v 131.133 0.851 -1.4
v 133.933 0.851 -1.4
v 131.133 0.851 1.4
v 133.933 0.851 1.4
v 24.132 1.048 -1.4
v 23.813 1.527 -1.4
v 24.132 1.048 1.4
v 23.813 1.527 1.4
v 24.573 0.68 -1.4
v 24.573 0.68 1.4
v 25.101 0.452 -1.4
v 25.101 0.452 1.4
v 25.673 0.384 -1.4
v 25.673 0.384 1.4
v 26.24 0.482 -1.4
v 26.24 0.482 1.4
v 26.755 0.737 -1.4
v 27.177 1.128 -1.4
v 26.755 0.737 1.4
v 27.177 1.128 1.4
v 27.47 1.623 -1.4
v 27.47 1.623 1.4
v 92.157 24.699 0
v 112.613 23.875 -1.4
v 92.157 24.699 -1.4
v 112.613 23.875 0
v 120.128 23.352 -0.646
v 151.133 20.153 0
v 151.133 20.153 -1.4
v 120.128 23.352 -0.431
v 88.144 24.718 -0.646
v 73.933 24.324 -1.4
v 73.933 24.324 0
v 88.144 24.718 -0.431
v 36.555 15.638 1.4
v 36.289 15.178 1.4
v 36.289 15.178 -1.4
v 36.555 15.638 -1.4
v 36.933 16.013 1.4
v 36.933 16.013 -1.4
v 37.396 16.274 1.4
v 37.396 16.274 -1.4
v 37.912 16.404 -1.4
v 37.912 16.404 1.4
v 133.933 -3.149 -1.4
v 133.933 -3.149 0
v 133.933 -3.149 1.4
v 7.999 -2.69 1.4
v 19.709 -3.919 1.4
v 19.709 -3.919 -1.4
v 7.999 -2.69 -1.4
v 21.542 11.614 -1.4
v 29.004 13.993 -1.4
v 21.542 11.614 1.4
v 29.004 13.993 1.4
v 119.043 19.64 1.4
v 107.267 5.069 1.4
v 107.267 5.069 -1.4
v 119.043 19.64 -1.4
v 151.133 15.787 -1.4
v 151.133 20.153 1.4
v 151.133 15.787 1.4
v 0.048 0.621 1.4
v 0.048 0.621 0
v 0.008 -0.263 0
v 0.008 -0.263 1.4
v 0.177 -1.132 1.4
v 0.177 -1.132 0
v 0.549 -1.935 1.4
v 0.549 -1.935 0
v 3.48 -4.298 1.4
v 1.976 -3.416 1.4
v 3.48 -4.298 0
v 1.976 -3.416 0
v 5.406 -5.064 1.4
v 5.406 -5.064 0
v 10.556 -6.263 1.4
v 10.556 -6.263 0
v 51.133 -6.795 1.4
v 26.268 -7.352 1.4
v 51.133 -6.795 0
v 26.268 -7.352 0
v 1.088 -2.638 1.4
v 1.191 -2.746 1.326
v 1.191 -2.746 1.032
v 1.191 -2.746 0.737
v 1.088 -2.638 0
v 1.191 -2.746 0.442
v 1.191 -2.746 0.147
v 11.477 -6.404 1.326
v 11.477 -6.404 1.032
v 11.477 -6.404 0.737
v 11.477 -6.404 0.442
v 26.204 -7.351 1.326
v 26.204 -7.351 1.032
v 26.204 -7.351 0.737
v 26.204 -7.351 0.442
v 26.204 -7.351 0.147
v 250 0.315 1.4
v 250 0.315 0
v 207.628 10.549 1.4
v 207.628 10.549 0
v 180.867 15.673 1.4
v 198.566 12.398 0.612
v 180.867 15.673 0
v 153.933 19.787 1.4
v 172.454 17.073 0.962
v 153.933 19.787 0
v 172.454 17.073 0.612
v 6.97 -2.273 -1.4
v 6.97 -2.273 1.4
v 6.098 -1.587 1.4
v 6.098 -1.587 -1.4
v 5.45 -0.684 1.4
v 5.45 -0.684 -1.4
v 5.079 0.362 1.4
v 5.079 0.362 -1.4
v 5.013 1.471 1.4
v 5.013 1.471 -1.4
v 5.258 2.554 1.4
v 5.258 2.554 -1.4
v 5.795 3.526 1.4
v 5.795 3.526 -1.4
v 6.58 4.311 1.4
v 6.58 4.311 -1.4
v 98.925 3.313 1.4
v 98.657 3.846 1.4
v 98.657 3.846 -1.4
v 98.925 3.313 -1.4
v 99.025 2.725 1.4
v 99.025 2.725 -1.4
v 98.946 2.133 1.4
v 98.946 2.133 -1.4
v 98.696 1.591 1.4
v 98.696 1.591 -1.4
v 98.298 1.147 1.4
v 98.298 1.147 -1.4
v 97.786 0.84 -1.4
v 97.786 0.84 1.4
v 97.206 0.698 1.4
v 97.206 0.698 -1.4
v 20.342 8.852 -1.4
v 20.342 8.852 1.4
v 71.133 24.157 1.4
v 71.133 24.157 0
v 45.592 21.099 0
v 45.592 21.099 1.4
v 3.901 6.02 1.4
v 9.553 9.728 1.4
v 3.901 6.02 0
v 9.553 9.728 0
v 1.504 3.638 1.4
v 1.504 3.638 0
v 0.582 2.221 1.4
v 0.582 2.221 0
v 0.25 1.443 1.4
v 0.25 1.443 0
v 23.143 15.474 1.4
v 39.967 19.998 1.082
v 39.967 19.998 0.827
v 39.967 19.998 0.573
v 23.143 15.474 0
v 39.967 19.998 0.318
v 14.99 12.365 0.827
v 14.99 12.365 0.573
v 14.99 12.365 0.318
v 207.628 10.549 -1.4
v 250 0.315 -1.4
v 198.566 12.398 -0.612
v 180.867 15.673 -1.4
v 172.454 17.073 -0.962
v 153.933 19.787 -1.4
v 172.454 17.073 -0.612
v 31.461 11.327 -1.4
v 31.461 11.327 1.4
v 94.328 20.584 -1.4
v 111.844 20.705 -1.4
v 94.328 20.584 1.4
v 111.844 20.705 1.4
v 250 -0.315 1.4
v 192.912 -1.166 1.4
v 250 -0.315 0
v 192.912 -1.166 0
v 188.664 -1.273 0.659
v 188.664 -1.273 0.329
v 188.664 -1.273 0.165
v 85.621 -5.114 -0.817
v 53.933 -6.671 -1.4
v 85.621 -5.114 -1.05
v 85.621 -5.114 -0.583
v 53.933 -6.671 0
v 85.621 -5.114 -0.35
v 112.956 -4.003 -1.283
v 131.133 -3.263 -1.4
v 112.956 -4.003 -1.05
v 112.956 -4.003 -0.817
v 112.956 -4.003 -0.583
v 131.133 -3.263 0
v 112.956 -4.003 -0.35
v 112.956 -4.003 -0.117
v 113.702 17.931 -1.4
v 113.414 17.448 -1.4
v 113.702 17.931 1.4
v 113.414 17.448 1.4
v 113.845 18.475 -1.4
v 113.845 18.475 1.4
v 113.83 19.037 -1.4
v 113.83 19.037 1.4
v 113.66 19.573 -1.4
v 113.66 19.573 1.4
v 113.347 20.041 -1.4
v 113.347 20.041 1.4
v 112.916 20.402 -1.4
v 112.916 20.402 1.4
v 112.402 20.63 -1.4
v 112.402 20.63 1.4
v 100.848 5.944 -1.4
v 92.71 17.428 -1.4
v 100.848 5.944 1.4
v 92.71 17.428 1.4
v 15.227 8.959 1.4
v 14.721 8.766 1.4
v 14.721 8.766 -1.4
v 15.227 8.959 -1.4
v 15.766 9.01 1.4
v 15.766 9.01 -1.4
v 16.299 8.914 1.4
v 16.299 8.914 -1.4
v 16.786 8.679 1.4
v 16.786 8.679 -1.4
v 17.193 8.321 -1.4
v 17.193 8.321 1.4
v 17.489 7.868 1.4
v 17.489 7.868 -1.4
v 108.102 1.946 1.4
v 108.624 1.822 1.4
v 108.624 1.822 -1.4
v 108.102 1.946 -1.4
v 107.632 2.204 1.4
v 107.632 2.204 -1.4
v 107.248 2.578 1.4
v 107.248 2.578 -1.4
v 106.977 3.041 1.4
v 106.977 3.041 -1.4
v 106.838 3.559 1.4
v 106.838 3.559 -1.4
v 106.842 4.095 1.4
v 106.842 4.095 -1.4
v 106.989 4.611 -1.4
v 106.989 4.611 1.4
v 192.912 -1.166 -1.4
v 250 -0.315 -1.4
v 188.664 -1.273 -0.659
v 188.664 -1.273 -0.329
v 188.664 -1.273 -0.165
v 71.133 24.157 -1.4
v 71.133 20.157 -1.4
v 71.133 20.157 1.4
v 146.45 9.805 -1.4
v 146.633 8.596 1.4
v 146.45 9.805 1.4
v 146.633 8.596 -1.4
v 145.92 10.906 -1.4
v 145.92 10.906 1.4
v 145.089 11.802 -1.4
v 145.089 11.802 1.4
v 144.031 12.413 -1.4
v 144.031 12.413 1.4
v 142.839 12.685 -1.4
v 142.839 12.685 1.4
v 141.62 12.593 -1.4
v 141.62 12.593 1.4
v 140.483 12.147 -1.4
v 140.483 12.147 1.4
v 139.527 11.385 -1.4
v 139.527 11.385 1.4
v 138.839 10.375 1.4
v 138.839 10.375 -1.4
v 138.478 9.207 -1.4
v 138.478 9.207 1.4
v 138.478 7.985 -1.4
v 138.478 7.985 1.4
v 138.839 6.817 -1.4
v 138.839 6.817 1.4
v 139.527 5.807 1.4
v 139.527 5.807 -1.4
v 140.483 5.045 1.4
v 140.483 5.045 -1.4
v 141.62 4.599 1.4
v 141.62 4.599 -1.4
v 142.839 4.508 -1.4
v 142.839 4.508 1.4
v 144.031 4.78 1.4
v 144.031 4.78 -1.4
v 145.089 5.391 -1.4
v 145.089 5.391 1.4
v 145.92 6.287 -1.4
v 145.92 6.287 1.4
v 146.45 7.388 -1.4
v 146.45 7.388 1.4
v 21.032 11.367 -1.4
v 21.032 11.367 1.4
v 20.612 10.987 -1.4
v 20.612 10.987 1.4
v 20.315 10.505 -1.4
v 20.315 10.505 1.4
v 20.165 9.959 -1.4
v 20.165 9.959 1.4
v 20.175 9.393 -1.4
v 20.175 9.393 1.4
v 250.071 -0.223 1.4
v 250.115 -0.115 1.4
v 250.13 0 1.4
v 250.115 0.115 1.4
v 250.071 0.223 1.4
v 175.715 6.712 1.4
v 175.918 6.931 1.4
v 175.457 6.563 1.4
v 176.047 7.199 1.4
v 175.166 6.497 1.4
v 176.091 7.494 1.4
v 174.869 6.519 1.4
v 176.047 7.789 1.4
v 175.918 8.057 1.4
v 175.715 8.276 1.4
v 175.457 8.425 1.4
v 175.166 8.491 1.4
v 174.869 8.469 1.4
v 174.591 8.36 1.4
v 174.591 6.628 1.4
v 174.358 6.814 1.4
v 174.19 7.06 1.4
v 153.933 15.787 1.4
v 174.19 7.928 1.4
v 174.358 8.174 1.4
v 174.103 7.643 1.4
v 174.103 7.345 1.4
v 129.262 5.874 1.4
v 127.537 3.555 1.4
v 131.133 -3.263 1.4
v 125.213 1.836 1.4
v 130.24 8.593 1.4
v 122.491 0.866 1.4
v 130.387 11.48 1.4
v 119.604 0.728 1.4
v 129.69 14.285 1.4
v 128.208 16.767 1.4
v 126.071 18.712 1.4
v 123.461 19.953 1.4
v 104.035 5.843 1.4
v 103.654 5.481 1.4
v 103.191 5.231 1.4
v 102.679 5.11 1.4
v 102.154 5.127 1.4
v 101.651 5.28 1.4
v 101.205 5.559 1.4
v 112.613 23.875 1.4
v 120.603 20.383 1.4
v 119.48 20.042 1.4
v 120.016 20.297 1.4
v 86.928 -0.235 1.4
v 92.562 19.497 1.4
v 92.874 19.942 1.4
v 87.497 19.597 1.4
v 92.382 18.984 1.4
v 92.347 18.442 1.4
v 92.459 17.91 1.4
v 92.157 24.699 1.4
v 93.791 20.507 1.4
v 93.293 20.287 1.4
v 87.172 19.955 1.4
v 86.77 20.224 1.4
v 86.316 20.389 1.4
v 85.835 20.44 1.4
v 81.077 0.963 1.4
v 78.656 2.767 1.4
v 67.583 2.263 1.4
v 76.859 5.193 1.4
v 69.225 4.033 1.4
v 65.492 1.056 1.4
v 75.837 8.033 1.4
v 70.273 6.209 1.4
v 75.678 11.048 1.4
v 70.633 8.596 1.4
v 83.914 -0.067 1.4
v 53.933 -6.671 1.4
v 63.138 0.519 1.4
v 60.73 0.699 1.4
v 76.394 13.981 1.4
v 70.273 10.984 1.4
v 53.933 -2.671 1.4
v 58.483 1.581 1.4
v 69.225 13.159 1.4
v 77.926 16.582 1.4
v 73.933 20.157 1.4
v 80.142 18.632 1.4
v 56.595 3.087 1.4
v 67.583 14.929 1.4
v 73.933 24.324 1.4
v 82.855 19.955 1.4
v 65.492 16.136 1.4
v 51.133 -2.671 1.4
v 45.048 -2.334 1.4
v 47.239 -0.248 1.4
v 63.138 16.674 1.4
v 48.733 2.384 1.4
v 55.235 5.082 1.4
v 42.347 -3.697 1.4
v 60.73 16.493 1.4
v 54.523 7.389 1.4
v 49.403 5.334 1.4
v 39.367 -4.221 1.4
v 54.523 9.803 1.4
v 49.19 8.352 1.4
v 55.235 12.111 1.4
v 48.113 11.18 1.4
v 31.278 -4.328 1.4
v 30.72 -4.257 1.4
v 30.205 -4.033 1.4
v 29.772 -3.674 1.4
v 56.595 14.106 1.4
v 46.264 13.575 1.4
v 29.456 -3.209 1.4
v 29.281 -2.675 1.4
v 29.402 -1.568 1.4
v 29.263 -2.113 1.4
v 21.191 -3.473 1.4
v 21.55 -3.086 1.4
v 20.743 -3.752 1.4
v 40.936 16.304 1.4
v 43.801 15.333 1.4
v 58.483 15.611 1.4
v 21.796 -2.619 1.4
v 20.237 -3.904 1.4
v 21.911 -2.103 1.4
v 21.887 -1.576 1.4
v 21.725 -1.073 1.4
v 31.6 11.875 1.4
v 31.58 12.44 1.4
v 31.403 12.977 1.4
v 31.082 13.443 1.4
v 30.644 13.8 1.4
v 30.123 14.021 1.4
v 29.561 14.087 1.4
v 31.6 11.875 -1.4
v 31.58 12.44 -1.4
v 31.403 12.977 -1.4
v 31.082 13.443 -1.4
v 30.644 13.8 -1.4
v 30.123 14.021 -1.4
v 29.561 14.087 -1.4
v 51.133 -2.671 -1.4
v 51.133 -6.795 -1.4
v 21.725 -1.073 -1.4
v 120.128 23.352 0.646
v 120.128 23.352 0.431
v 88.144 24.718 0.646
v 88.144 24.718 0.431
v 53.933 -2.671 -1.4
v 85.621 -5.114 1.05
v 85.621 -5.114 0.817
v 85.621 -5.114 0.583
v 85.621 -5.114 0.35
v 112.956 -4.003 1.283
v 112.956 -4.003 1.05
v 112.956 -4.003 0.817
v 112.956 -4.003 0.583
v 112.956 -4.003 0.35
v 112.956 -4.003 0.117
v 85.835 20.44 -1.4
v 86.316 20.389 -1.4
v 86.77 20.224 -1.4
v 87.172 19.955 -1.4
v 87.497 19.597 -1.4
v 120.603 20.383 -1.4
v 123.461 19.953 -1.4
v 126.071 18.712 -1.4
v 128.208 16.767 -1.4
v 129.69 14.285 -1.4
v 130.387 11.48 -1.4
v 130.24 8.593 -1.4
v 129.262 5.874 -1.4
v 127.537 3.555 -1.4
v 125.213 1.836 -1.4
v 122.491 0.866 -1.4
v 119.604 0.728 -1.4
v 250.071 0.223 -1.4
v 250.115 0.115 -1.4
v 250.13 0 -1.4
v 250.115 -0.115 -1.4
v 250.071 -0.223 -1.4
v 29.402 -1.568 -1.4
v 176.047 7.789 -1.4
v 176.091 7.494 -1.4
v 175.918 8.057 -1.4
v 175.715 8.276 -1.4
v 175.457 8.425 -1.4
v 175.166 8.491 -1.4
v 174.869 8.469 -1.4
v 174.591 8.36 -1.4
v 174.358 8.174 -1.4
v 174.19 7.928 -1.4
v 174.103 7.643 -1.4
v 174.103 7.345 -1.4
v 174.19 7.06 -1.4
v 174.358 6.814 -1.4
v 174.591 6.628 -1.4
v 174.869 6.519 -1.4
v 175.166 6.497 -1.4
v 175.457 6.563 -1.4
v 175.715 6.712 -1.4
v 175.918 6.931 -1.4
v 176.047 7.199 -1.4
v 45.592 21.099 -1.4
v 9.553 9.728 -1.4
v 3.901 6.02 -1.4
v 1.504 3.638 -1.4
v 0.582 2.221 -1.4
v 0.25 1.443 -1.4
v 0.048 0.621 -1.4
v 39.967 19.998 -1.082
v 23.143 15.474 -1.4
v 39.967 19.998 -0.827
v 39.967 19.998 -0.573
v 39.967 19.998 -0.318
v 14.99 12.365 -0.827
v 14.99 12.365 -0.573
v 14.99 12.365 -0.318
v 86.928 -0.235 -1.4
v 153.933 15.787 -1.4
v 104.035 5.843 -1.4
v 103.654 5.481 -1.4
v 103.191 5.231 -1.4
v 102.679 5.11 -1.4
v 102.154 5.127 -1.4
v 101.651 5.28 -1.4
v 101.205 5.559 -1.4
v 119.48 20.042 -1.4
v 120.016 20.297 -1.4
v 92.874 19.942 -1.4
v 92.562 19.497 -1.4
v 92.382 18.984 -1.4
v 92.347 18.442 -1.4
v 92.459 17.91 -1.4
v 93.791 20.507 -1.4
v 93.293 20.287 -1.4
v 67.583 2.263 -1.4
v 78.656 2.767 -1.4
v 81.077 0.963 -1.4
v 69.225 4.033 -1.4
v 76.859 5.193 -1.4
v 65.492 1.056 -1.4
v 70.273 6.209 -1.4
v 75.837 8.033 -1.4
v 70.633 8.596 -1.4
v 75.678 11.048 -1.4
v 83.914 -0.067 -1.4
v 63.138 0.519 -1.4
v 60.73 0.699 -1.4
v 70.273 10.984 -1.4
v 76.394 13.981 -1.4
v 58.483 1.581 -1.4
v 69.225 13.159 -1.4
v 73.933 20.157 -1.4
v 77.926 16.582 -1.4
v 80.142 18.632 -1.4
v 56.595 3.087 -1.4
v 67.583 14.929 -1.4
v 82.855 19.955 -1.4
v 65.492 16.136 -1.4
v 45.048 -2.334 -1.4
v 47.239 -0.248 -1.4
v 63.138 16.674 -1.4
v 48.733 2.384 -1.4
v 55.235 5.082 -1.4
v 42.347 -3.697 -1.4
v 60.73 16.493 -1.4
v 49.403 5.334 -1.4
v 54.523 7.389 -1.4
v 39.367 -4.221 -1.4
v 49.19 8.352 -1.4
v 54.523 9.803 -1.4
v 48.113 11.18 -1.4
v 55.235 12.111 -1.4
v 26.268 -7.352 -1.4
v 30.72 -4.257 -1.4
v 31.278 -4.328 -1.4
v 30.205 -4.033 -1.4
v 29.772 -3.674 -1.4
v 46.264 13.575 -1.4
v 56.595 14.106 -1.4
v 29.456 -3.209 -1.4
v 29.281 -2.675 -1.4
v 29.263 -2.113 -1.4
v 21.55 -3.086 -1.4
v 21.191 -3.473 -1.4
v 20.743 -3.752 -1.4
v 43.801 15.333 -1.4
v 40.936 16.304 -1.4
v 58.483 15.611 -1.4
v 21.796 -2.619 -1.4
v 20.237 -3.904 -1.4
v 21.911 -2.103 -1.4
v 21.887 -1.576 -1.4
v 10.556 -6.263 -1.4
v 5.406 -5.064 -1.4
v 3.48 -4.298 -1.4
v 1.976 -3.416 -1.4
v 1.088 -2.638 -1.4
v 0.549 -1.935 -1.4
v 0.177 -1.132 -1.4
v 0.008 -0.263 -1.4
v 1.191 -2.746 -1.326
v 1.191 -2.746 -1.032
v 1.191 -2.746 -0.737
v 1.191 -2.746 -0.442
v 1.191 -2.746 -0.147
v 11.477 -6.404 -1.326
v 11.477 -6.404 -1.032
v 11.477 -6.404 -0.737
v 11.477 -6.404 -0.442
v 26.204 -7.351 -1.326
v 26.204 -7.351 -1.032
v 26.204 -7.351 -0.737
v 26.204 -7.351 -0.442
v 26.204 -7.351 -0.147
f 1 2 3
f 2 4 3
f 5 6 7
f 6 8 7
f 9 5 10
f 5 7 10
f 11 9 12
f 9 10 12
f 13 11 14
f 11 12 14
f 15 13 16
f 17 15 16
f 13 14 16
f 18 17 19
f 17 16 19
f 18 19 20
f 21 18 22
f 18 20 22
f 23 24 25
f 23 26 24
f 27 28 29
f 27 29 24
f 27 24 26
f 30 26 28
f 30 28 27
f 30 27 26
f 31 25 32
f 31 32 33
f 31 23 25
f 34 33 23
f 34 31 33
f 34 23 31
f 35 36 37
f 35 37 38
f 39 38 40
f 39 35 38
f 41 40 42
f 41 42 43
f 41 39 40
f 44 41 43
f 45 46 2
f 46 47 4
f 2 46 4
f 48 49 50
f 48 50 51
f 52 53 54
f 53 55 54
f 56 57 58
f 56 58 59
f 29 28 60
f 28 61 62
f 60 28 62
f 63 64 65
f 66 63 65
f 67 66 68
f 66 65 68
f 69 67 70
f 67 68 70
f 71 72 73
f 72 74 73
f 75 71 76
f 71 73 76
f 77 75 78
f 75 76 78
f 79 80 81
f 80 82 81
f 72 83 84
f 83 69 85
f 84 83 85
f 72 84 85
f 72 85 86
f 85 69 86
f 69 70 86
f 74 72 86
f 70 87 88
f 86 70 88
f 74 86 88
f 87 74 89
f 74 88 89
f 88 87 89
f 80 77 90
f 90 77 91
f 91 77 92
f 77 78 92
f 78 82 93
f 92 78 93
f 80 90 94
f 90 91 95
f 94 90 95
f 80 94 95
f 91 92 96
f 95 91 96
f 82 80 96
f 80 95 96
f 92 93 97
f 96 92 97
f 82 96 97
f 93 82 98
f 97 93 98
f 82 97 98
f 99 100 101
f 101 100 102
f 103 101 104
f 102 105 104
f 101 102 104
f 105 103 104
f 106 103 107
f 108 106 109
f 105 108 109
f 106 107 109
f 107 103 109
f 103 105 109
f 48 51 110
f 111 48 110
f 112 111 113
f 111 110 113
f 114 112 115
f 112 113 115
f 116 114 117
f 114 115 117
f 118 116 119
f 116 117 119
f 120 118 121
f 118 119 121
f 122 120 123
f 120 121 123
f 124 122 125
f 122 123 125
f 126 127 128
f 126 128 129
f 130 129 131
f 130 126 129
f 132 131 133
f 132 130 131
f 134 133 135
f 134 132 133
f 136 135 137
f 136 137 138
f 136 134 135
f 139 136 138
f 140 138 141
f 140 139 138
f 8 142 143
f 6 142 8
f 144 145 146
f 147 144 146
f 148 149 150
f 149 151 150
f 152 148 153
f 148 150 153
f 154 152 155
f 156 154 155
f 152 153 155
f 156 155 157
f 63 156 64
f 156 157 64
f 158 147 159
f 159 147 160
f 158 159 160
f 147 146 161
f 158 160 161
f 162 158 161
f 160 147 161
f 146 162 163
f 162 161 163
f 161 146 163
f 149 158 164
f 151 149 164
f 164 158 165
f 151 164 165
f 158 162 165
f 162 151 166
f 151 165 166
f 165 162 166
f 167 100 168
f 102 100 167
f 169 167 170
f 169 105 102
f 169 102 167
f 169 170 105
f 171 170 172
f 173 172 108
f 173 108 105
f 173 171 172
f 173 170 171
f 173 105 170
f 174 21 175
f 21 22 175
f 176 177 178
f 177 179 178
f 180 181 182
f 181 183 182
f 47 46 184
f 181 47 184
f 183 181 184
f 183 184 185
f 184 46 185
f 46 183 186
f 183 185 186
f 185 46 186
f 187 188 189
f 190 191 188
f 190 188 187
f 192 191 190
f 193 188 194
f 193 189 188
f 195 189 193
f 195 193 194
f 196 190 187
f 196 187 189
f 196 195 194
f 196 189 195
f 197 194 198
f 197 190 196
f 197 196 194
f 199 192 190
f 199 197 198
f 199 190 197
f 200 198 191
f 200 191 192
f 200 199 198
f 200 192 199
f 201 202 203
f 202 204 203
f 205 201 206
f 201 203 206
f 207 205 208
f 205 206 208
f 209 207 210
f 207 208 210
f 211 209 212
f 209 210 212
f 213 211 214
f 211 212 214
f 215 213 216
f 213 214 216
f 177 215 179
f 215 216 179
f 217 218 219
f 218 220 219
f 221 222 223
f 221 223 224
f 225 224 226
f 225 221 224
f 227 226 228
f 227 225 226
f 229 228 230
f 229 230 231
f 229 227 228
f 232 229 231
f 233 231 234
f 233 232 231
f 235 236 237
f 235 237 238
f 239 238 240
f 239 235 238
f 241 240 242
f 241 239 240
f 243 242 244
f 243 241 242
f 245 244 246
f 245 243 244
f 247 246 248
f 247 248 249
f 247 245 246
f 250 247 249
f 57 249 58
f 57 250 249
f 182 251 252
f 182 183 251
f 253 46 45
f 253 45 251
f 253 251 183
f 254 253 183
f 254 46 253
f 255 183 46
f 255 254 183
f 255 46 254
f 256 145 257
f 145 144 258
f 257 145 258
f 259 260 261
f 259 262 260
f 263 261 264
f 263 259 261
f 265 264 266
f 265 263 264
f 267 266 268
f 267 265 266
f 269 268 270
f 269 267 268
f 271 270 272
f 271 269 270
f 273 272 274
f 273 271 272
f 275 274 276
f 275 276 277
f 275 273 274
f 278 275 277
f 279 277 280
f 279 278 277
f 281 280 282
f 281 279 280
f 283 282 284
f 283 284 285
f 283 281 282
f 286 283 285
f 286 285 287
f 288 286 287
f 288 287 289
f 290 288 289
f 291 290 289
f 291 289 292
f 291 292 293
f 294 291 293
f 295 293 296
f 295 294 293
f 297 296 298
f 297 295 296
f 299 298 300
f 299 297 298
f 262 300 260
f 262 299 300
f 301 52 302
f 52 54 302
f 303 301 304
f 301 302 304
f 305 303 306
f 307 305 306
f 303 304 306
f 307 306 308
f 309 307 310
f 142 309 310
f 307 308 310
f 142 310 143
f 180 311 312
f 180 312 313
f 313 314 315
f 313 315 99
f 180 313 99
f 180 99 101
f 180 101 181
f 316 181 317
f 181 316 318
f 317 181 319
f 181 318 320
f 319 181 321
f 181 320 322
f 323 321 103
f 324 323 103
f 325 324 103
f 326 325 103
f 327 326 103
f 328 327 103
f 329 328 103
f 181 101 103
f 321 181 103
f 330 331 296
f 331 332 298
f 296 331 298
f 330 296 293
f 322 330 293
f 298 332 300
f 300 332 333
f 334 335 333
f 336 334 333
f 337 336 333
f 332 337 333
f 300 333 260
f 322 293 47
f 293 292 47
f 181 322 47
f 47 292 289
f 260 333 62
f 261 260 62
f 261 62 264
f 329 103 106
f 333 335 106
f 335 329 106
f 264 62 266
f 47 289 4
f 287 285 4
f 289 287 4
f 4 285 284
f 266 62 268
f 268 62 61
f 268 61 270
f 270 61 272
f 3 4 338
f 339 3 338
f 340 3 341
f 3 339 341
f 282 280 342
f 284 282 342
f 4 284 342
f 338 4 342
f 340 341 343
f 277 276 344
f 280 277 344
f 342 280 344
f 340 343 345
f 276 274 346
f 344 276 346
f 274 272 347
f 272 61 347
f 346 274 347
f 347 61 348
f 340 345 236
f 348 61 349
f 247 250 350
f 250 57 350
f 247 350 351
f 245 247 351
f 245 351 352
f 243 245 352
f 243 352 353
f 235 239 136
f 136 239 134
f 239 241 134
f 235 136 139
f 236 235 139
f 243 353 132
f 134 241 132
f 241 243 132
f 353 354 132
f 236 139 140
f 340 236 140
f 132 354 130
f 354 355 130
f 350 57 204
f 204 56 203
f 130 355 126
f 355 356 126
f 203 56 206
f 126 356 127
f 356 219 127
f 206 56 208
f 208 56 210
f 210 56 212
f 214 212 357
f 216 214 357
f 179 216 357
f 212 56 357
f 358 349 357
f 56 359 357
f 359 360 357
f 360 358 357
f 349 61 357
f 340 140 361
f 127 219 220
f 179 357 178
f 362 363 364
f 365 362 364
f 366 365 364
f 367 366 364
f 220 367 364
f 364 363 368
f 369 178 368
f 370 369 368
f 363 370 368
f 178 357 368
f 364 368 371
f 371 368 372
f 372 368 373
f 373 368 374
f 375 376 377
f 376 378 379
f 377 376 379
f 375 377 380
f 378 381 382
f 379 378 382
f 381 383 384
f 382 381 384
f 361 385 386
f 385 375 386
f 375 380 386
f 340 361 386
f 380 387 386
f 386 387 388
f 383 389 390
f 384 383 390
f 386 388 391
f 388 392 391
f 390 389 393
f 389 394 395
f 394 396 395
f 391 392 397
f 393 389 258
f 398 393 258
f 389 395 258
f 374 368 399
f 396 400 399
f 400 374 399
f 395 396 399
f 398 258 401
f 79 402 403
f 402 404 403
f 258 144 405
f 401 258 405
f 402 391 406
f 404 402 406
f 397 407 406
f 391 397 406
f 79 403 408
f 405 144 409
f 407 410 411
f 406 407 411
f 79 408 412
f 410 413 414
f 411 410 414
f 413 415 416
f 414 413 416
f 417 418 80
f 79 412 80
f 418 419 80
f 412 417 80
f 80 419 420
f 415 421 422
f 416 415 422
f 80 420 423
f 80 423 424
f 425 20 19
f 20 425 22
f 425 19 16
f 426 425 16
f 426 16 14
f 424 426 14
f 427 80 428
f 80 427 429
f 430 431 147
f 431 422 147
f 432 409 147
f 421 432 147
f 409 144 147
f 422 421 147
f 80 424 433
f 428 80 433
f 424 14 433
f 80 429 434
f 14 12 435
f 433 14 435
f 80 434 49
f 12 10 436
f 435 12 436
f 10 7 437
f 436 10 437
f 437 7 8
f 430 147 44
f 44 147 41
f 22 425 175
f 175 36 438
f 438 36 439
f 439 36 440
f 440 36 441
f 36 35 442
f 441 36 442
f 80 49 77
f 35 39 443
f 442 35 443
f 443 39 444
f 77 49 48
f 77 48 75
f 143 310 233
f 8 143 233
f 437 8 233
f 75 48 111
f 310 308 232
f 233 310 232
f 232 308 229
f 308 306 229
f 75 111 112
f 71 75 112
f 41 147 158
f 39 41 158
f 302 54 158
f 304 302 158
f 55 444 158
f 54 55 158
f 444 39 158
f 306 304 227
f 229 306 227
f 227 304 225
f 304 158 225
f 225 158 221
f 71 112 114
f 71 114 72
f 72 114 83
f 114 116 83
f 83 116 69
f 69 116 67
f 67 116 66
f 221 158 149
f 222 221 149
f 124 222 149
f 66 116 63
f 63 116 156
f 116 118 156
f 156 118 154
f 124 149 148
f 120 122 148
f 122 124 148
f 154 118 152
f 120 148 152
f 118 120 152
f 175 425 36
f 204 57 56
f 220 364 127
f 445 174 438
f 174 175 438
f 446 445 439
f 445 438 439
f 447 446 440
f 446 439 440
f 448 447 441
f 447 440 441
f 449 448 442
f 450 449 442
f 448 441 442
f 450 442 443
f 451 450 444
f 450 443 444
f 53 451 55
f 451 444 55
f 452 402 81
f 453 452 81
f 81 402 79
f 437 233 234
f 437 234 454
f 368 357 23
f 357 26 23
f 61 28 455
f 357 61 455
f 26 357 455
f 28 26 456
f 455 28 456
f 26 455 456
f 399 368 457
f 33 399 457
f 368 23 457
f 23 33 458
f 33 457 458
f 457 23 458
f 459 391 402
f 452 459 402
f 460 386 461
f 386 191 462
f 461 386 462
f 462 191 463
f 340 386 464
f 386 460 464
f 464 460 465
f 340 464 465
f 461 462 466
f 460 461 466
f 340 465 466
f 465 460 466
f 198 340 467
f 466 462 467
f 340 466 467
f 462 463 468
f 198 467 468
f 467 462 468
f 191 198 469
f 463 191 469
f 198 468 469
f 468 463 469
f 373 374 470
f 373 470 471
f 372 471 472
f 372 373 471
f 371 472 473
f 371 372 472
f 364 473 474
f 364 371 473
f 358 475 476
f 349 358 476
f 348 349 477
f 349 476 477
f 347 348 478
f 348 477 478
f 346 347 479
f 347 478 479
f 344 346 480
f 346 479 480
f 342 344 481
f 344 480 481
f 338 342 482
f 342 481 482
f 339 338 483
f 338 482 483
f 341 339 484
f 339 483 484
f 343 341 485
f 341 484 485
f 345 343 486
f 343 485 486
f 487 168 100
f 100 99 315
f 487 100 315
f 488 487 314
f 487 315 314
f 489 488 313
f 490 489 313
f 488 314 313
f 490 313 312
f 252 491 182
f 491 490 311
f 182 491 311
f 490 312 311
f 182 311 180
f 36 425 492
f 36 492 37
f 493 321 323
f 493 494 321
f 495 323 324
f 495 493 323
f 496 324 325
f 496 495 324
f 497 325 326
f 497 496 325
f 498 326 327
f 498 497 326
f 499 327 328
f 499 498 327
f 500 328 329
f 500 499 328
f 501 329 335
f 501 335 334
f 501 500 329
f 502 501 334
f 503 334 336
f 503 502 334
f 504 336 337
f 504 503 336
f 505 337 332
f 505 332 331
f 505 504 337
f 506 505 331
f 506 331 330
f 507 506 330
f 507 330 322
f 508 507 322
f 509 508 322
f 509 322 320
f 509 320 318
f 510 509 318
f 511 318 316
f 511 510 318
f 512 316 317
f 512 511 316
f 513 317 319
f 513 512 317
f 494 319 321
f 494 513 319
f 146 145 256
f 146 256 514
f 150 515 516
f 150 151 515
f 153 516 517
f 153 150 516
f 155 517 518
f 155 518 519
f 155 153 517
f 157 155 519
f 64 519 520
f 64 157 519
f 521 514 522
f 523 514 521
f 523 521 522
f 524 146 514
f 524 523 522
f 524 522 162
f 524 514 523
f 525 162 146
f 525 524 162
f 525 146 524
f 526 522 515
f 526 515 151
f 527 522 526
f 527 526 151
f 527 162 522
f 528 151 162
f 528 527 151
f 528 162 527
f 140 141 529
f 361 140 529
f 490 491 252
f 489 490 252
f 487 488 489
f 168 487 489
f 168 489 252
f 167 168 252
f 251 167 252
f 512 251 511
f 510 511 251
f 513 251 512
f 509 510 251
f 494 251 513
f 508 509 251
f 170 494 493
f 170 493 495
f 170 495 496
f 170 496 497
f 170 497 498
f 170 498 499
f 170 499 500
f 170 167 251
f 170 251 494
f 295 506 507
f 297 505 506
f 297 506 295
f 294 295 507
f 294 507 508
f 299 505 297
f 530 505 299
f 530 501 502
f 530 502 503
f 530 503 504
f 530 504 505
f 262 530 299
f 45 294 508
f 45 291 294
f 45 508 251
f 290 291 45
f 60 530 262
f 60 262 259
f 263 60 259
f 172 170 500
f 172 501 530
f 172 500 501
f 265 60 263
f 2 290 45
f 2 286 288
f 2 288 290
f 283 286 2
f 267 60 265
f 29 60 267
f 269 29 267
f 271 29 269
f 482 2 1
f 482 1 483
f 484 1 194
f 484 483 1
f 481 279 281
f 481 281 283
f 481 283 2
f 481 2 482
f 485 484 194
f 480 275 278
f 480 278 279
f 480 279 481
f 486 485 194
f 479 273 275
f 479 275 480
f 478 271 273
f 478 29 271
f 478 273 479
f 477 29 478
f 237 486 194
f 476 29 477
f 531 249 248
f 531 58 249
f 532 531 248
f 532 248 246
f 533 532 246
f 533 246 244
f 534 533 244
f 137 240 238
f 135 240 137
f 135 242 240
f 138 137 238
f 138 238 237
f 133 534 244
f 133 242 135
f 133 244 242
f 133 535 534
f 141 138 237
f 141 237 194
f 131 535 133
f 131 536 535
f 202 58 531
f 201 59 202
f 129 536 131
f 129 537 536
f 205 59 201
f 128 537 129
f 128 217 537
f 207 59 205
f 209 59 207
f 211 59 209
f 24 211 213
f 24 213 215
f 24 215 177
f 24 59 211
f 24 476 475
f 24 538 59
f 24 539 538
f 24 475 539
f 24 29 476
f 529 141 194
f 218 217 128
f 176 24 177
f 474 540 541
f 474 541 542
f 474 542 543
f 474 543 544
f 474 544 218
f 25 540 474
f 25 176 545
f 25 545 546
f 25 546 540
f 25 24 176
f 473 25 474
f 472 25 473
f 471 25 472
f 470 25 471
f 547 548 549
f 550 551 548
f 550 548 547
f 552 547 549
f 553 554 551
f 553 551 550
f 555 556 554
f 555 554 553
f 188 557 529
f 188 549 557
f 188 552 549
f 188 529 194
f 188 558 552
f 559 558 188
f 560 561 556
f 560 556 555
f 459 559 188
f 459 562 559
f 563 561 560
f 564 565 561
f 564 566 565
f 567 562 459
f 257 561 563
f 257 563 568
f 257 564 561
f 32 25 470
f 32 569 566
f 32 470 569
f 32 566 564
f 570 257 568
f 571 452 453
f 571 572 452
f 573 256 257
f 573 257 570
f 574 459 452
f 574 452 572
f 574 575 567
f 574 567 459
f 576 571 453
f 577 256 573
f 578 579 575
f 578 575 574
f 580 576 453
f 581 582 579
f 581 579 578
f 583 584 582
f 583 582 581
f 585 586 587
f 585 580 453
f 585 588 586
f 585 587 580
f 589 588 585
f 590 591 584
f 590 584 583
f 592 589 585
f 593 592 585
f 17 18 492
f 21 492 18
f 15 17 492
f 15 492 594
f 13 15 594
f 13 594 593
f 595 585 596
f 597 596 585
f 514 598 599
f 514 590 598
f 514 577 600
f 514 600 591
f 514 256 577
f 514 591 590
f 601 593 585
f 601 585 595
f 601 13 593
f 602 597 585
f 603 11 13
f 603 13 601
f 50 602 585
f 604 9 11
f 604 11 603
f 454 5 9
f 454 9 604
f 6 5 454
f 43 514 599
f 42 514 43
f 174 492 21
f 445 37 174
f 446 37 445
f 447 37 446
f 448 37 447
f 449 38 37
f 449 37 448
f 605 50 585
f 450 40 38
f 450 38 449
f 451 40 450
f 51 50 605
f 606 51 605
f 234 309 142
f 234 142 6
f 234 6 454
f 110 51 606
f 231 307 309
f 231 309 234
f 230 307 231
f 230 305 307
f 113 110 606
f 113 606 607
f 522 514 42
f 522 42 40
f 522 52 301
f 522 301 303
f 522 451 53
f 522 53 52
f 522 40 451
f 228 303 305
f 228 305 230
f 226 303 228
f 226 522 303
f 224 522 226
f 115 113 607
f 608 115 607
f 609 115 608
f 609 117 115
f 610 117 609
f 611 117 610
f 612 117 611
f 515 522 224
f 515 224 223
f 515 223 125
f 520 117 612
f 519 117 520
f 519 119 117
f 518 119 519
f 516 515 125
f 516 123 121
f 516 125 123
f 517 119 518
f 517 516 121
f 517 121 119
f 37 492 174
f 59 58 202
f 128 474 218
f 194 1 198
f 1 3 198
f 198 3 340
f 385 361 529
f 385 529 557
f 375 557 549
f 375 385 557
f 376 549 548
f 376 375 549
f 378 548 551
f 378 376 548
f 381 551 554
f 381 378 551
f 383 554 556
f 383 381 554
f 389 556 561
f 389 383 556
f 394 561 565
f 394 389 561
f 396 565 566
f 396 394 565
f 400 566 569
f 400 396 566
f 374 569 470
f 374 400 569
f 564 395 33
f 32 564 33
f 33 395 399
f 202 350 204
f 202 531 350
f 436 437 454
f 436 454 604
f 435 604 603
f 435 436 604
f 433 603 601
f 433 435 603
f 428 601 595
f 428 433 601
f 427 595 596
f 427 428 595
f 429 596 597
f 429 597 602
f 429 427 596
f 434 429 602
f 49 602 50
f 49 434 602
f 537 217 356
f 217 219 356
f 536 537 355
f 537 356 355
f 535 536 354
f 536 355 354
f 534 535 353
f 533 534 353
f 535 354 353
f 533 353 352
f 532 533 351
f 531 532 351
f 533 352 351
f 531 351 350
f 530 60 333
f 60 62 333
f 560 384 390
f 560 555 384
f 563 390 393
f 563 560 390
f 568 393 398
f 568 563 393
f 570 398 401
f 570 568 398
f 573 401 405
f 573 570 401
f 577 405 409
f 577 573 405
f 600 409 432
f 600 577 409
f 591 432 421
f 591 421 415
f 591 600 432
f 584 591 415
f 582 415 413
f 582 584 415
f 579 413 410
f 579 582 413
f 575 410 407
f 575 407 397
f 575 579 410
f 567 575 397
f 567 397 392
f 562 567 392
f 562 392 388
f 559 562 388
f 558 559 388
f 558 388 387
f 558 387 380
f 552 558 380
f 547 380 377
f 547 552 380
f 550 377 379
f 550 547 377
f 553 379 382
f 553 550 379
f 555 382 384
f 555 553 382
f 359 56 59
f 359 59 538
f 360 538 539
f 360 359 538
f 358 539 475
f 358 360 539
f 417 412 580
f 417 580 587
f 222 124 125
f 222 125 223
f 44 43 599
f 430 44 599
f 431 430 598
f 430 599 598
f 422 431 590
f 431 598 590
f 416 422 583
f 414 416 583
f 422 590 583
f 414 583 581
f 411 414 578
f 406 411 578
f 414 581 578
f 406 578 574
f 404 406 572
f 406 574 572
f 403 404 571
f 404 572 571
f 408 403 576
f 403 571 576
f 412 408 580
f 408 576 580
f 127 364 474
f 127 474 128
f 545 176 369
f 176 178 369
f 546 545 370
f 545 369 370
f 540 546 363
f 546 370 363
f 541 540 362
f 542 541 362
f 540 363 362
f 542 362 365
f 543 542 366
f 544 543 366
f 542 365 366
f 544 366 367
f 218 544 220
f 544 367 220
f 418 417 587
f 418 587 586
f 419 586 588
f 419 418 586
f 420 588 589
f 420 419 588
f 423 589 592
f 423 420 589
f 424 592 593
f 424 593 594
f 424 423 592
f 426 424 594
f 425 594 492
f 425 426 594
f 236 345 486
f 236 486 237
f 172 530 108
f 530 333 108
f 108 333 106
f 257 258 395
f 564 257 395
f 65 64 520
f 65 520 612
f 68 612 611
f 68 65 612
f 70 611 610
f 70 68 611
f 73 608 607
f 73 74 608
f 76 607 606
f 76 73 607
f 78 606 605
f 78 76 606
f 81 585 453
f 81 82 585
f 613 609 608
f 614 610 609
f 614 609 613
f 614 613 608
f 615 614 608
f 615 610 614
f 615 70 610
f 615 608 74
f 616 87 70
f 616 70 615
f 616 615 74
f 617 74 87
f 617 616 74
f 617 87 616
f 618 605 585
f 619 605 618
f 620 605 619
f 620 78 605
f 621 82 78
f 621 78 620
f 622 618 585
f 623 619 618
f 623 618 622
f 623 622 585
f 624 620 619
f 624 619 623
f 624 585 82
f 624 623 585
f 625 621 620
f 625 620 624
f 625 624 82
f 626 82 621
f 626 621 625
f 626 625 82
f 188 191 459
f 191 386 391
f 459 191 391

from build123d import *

# Parameters (mm, degrees)
SKETCH_2_R      = 8.1
SKETCH_2_R_2    = 4.1
SKETCH_2_R_3    = 1
EXTRUDE_2_DEPTH = 1.4


with BuildPart() as part:
    # Эскиз2 → Бобышка-Вытянуть2 (new, symmetric)
    with BuildSketch(Plane.XY):
        with BuildLine():
            Line((151.132619318, 20.152925753), (151.132619318, 15.787470759))
            Line((151.132619318, 15.787470759), (153.932619318, 15.787470759))
            Line((153.932619318, 15.787470759), (153.932619318, 19.787470759))
            add(Edge.make_bspline(
                [(250, 0.315), (249.15566774, 0.545019818), (246.720175697, 1.208516241), (242.391332083, 2.35833905), (236.849761203, 3.787625359), (230.779918277, 5.29800883), (224.455917945, 6.812866018), (218.030543493, 8.29161062), (211.562405041, 9.719735042), (205.072411505, 11.092374915), (198.567970908, 12.407850707), (192.052369908, 13.665297902), (185.527619967, 14.864093279), (178.995338985, 16.003404752), (172.457064735, 17.082388086), (165.914317088, 18.099827809), (159.739714866, 19.000386852), (155.744292591, 19.547112651), (153.932619318, 19.787470759)],
                knots=[0, 0, 0, 0, 0.0101622, 0.029313053, 0.052011605, 0.076619468, 0.101948061, 0.127526132, 0.153184131, 0.178867888, 0.204557903, 0.230245712, 0.255925967, 0.281594302, 0.30724642, 0.332878042, 0.358484538, 0.379707003, 0.379707003, 0.379707003, 0.379707003], degree=3))
            ThreePointArc((250, 0.315), (250.130477272, 0), (250, -0.315))
            add(Edge.make_bspline(
                [(133.932619318, -3.149352186), (136.150252366, -3.05984138), (140.66441482, -2.879164577), (147.472013762, -2.613922958), (154.352602411, -2.355626415), (161.225044134, -2.109369921), (168.090869746, -1.876634074), (174.951578522, -1.658643104), (181.808595966, -1.456378123), (188.663234462, -1.270383377), (195.516645168, -1.101112884), (202.369532894, -0.948617189), (211.49919029, -0.767742353), (220.603098666, -0.619939742), (229.617630172, -0.50292618), (236.087353854, -0.431514192), (241.980776913, -0.376520461), (246.558970011, -0.339535886), (249.120490965, -0.321271242), (250, -0.315)],
                knots=[0.541906346, 0.541906346, 0.541906346, 0.541906346, 0.568176028, 0.595379569, 0.622543445, 0.64967326, 0.676775201, 0.703855228, 0.730918775, 0.757971338, 0.785017763, 0.812061651, 0.839103366, 0.893099152, 0.919831065, 0.945809917, 0.969680601, 0.989589706, 1, 1, 1, 1], degree=3))
            Line((133.932619318, -3.149352186), (133.932619318, 0.850647814))
            Line((133.932619318, 0.850647814), (131.132619318, 0.850647814))
            Line((131.132619318, 0.850647814), (131.132619318, -3.262735091))
            add(Edge.make_bspline(
                [(53.932619318, -6.670677263), (55.356569482, -6.605720394), (59.058679651, -6.431131786), (65.052094606, -6.13285227), (71.91077271, -5.784005184), (78.771375577, -5.439680462), (85.61049861, -5.110951262), (92.43210759, -4.804953337), (99.255031191, -4.531981668), (106.097378406, -4.278274685), (112.969211681, -4.003089942), (119.864404255, -3.723176202), (125.92308308, -3.47492717), (129.679854903, -3.321735217), (131.132619318, -3.262735091)],
                knots=[0.225966113, 0.225966113, 0.225966113, 0.225966113, 0.242837762, 0.269833583, 0.296993022, 0.324123272, 0.351139107, 0.378035509, 0.404946016, 0.431960837, 0.459078395, 0.4863474, 0.51364083, 0.530850189, 0.530850189, 0.530850189, 0.530850189], degree=3))
            Line((53.932619318, -6.670677263), (53.932619318, -2.670677263))
            Line((53.932619318, -2.670677263), (51.132619318, -2.670677263))
            Line((51.132619318, -2.670677263), (51.132619318, -6.795360627))
            add(Edge.make_bspline(
                [(0.047975001, 0.621424995), (0.022713821, 0.373490081), (-0.027820788, -0.12249998), (0.077991213, -0.884434595), (0.349695651, -1.638838075), (0.814331136, -2.365068928), (1.463480781, -3.039275249), (2.290973018, -3.660999474), (3.305928751, -4.235779626), (4.53525562, -4.773674148), (6.029745689, -5.282192169), (7.868981216, -5.765316681), (10.168831393, -6.221716597), (13.07543819, -6.639618735), (16.728115364, -6.992956742), (21.189952097, -7.247345149), (26.399984417, -7.376638853), (32.197398565, -7.376256917), (38.39780676, -7.261436583), (44.752137938, -7.05998551), (49.023344092, -6.886827907), (51.132619318, -6.795360627)],
                knots=[0, 0, 0, 0, 0.002941446, 0.005884319, 0.00901613, 0.012364547, 0.016007934, 0.020036845, 0.024573728, 0.029783835, 0.03589701, 0.04324044, 0.052275965, 0.063634589, 0.077983176, 0.095698161, 0.116520086, 0.13966073, 0.16431217, 0.18991889, 0.214908072, 0.214908072, 0.214908072, 0.214908072], degree=3))
            add(Edge.make_bspline(
                [(71.132619318, 24.157469486), (70.635982629, 24.125241372), (68.110579653, 23.953963558), (63.575410502, 23.578006358), (57.555189551, 22.924946655), (51.605762689, 22.119065518), (45.744400312, 21.156564429), (39.995857594, 20.035371386), (34.397919843, 18.75631623), (29.010382104, 17.327615604), (23.925798409, 15.771864917), (19.27067884, 14.13426943), (15.179098392, 12.483335433), (11.740475791, 10.89561099), (8.959371869, 9.429577361), (6.760891181, 8.108603195), (5.033709749, 6.92463805), (3.671694934, 5.85422966), (2.592101124, 4.871305364), (1.738175669, 3.952595739), (1.069870831, 3.080946369), (0.571645411, 2.241622098), (0.2157739, 1.430785392), (0.102255582, 0.88324169), (0.047975001, 0.621424995)],
                knots=[0.701142916, 0.701142916, 0.701142916, 0.701142916, 0.706922144, 0.73053591, 0.7539832, 0.77723469, 0.800246382, 0.822950709, 0.845237155, 0.866915896, 0.887662335, 0.906968281, 0.924203157, 0.938878975, 0.950931611, 0.960693484, 0.968646729, 0.975232933, 0.980794744, 0.985583761, 0.989781539, 0.993521313, 0.996902113, 1, 1, 1, 1], degree=3))
            Line((71.132619318, 24.157469486), (71.132619318, 20.157469486))
            Line((71.132619318, 20.157469486), (73.932619318, 20.157469486))
            Line((73.932619318, 20.157469486), (73.932619318, 24.323871534))
            add(Edge.make_bspline(
                [(151.132619318, 20.152925753), (149.51271539, 20.360855756), (145.712882211, 20.834305053), (139.731359791, 21.525676112), (133.19183673, 22.212004248), (126.658683026, 22.825721427), (120.136770918, 23.363973264), (113.62856714, 23.824677322), (107.152732037, 24.200242592), (100.741095693, 24.498399508), (94.411752715, 24.686649766), (88.155917993, 24.740095648), (81.949043055, 24.658849141), (77.212383792, 24.491578654), (74.545027167, 24.35694527), (73.932619318, 24.323871534)],
                knots=[0.390637302, 0.390637302, 0.390637302, 0.390637302, 0.409602822, 0.435103874, 0.460559416, 0.485959195, 0.51130307, 0.536551515, 0.561723366, 0.586628867, 0.611085431, 0.6352512, 0.659272176, 0.683163753, 0.690285585, 0.690285585, 0.690285585, 0.690285585], degree=3))
        make_face()
        with Locations((62.532619318, 8.596197208)):
            Circle(SKETCH_2_R, mode=Mode.SUBTRACT)
        with Locations((142.532619318, 8.596197208)):
            Circle(SKETCH_2_R_2, mode=Mode.SUBTRACT)
        with Locations((175.091334091, 7.493910357)):
            Circle(SKETCH_2_R_3, mode=Mode.SUBTRACT)
        with BuildLine():
            Line((87.496942629, 19.59683512), (98.656957359, 3.846404038))
            ThreePointArc((98.656957359, 3.846404038), (98.841412786, 1.852917443), (97.205894504, 0.698321168))
            Line((97.205894504, 0.698321168), (86.928494978, -0.234664059))
            ThreePointArc((86.928494978, -0.234664059), (75.647085804, 9.534937552), (85.834710285, 20.440331448))
            ThreePointArc((85.834710285, 20.440331448), (86.770100886, 20.22407123), (87.496942629, 19.59683512))
        make_face(mode=Mode.SUBTRACT)
        with BuildLine():
            Line((107.26658781, 5.068960843), (119.042711354, 19.640469699))
            ThreePointArc((119.042711354, 19.640469699), (119.738361249, 20.189071191), (120.602738696, 20.383349351))
            ThreePointArc((120.602738696, 20.383349351), (130.419922424, 10.031300237), (119.603876283, 0.727797506))
            Line((119.603876283, 0.727797506), (108.623842739, 1.821697682))
            ThreePointArc((108.623842739, 1.821697682), (106.976814232, 3.040567769), (107.26658781, 5.068960843))
        make_face(mode=Mode.SUBTRACT)
        with BuildLine():
            Line((92.710261403, 17.428221559), (100.847534604, 5.943867476))
            ThreePointArc((100.847534604, 5.943867476), (102.41617089, 5.101141005), (104.034940499, 5.843025535))
            Line((104.034940499, 5.843025535), (113.413576859, 17.447937989))
            ThreePointArc((113.413576859, 17.447937989), (113.659822033, 19.573166514), (111.84428559, 20.7050059))
            Line((111.84428559, 20.7050059), (94.32837603, 20.584447529))
            ThreePointArc((94.32837603, 20.584447529), (92.562400415, 19.496921566), (92.710261403, 17.428221559))
        make_face(mode=Mode.SUBTRACT)
        with BuildLine():
            Line((17.488708089, 7.868002897), (21.725441093, -1.073266618))
            ThreePointArc((21.725441093, -1.073266618), (21.549996986, -3.085882804), (19.709418924, -3.918755509))
            Line((19.709418924, -3.918755509), (7.999391348, -2.690370853))
            ThreePointArc((7.999391348, -2.690370853), (5.078852056, 0.362162442), (6.580135706, 4.311042875))
            Line((6.580135706, 4.311042875), (14.721240391, 8.766081587))
            ThreePointArc((14.721240391, 8.766081587), (16.29867531, 8.913940332), (17.488708089, 7.868002897))
        make_face(mode=Mode.SUBTRACT)
        with BuildLine():
            Line((29.401621993, -1.567898965), (36.28872379, 15.177681436))
            ThreePointArc((36.28872379, 15.177681436), (36.93262885, 16.01260855), (37.911651949, 16.404055587))
            ThreePointArc((37.911651949, 16.404055587), (49.40696202, 6.85120019), (39.366777065, -4.221012142))
            Line((39.366777065, -4.221012142), (31.277857225, -4.328453595))
            ThreePointArc((31.277857225, -4.328453595), (29.59717908, -3.452864074), (29.401621993, -1.567898965))
        make_face(mode=Mode.SUBTRACT)
        with BuildLine():
            Line((20.342244628, 8.85190119), (23.813024955, 1.527110532))
            ThreePointArc((23.813024955, 1.527110532), (25.672695714, 0.384197539), (27.470064023, 1.622782457))
            Line((27.470064023, 1.622782457), (31.461008962, 11.326528867))
            ThreePointArc((31.461008962, 11.326528867), (31.082028751, 13.44264333), (29.003823035, 13.992759157))
            Line((29.003823035, 13.992759157), (21.542097769, 11.613803404))
            ThreePointArc((21.542097769, 11.613803404), (20.315234657, 10.50521233), (20.342244628, 8.85190119))
        make_face(mode=Mode.SUBTRACT)
    extrude(amount=EXTRUDE_2_DEPTH, both=True)


solid = part.part
